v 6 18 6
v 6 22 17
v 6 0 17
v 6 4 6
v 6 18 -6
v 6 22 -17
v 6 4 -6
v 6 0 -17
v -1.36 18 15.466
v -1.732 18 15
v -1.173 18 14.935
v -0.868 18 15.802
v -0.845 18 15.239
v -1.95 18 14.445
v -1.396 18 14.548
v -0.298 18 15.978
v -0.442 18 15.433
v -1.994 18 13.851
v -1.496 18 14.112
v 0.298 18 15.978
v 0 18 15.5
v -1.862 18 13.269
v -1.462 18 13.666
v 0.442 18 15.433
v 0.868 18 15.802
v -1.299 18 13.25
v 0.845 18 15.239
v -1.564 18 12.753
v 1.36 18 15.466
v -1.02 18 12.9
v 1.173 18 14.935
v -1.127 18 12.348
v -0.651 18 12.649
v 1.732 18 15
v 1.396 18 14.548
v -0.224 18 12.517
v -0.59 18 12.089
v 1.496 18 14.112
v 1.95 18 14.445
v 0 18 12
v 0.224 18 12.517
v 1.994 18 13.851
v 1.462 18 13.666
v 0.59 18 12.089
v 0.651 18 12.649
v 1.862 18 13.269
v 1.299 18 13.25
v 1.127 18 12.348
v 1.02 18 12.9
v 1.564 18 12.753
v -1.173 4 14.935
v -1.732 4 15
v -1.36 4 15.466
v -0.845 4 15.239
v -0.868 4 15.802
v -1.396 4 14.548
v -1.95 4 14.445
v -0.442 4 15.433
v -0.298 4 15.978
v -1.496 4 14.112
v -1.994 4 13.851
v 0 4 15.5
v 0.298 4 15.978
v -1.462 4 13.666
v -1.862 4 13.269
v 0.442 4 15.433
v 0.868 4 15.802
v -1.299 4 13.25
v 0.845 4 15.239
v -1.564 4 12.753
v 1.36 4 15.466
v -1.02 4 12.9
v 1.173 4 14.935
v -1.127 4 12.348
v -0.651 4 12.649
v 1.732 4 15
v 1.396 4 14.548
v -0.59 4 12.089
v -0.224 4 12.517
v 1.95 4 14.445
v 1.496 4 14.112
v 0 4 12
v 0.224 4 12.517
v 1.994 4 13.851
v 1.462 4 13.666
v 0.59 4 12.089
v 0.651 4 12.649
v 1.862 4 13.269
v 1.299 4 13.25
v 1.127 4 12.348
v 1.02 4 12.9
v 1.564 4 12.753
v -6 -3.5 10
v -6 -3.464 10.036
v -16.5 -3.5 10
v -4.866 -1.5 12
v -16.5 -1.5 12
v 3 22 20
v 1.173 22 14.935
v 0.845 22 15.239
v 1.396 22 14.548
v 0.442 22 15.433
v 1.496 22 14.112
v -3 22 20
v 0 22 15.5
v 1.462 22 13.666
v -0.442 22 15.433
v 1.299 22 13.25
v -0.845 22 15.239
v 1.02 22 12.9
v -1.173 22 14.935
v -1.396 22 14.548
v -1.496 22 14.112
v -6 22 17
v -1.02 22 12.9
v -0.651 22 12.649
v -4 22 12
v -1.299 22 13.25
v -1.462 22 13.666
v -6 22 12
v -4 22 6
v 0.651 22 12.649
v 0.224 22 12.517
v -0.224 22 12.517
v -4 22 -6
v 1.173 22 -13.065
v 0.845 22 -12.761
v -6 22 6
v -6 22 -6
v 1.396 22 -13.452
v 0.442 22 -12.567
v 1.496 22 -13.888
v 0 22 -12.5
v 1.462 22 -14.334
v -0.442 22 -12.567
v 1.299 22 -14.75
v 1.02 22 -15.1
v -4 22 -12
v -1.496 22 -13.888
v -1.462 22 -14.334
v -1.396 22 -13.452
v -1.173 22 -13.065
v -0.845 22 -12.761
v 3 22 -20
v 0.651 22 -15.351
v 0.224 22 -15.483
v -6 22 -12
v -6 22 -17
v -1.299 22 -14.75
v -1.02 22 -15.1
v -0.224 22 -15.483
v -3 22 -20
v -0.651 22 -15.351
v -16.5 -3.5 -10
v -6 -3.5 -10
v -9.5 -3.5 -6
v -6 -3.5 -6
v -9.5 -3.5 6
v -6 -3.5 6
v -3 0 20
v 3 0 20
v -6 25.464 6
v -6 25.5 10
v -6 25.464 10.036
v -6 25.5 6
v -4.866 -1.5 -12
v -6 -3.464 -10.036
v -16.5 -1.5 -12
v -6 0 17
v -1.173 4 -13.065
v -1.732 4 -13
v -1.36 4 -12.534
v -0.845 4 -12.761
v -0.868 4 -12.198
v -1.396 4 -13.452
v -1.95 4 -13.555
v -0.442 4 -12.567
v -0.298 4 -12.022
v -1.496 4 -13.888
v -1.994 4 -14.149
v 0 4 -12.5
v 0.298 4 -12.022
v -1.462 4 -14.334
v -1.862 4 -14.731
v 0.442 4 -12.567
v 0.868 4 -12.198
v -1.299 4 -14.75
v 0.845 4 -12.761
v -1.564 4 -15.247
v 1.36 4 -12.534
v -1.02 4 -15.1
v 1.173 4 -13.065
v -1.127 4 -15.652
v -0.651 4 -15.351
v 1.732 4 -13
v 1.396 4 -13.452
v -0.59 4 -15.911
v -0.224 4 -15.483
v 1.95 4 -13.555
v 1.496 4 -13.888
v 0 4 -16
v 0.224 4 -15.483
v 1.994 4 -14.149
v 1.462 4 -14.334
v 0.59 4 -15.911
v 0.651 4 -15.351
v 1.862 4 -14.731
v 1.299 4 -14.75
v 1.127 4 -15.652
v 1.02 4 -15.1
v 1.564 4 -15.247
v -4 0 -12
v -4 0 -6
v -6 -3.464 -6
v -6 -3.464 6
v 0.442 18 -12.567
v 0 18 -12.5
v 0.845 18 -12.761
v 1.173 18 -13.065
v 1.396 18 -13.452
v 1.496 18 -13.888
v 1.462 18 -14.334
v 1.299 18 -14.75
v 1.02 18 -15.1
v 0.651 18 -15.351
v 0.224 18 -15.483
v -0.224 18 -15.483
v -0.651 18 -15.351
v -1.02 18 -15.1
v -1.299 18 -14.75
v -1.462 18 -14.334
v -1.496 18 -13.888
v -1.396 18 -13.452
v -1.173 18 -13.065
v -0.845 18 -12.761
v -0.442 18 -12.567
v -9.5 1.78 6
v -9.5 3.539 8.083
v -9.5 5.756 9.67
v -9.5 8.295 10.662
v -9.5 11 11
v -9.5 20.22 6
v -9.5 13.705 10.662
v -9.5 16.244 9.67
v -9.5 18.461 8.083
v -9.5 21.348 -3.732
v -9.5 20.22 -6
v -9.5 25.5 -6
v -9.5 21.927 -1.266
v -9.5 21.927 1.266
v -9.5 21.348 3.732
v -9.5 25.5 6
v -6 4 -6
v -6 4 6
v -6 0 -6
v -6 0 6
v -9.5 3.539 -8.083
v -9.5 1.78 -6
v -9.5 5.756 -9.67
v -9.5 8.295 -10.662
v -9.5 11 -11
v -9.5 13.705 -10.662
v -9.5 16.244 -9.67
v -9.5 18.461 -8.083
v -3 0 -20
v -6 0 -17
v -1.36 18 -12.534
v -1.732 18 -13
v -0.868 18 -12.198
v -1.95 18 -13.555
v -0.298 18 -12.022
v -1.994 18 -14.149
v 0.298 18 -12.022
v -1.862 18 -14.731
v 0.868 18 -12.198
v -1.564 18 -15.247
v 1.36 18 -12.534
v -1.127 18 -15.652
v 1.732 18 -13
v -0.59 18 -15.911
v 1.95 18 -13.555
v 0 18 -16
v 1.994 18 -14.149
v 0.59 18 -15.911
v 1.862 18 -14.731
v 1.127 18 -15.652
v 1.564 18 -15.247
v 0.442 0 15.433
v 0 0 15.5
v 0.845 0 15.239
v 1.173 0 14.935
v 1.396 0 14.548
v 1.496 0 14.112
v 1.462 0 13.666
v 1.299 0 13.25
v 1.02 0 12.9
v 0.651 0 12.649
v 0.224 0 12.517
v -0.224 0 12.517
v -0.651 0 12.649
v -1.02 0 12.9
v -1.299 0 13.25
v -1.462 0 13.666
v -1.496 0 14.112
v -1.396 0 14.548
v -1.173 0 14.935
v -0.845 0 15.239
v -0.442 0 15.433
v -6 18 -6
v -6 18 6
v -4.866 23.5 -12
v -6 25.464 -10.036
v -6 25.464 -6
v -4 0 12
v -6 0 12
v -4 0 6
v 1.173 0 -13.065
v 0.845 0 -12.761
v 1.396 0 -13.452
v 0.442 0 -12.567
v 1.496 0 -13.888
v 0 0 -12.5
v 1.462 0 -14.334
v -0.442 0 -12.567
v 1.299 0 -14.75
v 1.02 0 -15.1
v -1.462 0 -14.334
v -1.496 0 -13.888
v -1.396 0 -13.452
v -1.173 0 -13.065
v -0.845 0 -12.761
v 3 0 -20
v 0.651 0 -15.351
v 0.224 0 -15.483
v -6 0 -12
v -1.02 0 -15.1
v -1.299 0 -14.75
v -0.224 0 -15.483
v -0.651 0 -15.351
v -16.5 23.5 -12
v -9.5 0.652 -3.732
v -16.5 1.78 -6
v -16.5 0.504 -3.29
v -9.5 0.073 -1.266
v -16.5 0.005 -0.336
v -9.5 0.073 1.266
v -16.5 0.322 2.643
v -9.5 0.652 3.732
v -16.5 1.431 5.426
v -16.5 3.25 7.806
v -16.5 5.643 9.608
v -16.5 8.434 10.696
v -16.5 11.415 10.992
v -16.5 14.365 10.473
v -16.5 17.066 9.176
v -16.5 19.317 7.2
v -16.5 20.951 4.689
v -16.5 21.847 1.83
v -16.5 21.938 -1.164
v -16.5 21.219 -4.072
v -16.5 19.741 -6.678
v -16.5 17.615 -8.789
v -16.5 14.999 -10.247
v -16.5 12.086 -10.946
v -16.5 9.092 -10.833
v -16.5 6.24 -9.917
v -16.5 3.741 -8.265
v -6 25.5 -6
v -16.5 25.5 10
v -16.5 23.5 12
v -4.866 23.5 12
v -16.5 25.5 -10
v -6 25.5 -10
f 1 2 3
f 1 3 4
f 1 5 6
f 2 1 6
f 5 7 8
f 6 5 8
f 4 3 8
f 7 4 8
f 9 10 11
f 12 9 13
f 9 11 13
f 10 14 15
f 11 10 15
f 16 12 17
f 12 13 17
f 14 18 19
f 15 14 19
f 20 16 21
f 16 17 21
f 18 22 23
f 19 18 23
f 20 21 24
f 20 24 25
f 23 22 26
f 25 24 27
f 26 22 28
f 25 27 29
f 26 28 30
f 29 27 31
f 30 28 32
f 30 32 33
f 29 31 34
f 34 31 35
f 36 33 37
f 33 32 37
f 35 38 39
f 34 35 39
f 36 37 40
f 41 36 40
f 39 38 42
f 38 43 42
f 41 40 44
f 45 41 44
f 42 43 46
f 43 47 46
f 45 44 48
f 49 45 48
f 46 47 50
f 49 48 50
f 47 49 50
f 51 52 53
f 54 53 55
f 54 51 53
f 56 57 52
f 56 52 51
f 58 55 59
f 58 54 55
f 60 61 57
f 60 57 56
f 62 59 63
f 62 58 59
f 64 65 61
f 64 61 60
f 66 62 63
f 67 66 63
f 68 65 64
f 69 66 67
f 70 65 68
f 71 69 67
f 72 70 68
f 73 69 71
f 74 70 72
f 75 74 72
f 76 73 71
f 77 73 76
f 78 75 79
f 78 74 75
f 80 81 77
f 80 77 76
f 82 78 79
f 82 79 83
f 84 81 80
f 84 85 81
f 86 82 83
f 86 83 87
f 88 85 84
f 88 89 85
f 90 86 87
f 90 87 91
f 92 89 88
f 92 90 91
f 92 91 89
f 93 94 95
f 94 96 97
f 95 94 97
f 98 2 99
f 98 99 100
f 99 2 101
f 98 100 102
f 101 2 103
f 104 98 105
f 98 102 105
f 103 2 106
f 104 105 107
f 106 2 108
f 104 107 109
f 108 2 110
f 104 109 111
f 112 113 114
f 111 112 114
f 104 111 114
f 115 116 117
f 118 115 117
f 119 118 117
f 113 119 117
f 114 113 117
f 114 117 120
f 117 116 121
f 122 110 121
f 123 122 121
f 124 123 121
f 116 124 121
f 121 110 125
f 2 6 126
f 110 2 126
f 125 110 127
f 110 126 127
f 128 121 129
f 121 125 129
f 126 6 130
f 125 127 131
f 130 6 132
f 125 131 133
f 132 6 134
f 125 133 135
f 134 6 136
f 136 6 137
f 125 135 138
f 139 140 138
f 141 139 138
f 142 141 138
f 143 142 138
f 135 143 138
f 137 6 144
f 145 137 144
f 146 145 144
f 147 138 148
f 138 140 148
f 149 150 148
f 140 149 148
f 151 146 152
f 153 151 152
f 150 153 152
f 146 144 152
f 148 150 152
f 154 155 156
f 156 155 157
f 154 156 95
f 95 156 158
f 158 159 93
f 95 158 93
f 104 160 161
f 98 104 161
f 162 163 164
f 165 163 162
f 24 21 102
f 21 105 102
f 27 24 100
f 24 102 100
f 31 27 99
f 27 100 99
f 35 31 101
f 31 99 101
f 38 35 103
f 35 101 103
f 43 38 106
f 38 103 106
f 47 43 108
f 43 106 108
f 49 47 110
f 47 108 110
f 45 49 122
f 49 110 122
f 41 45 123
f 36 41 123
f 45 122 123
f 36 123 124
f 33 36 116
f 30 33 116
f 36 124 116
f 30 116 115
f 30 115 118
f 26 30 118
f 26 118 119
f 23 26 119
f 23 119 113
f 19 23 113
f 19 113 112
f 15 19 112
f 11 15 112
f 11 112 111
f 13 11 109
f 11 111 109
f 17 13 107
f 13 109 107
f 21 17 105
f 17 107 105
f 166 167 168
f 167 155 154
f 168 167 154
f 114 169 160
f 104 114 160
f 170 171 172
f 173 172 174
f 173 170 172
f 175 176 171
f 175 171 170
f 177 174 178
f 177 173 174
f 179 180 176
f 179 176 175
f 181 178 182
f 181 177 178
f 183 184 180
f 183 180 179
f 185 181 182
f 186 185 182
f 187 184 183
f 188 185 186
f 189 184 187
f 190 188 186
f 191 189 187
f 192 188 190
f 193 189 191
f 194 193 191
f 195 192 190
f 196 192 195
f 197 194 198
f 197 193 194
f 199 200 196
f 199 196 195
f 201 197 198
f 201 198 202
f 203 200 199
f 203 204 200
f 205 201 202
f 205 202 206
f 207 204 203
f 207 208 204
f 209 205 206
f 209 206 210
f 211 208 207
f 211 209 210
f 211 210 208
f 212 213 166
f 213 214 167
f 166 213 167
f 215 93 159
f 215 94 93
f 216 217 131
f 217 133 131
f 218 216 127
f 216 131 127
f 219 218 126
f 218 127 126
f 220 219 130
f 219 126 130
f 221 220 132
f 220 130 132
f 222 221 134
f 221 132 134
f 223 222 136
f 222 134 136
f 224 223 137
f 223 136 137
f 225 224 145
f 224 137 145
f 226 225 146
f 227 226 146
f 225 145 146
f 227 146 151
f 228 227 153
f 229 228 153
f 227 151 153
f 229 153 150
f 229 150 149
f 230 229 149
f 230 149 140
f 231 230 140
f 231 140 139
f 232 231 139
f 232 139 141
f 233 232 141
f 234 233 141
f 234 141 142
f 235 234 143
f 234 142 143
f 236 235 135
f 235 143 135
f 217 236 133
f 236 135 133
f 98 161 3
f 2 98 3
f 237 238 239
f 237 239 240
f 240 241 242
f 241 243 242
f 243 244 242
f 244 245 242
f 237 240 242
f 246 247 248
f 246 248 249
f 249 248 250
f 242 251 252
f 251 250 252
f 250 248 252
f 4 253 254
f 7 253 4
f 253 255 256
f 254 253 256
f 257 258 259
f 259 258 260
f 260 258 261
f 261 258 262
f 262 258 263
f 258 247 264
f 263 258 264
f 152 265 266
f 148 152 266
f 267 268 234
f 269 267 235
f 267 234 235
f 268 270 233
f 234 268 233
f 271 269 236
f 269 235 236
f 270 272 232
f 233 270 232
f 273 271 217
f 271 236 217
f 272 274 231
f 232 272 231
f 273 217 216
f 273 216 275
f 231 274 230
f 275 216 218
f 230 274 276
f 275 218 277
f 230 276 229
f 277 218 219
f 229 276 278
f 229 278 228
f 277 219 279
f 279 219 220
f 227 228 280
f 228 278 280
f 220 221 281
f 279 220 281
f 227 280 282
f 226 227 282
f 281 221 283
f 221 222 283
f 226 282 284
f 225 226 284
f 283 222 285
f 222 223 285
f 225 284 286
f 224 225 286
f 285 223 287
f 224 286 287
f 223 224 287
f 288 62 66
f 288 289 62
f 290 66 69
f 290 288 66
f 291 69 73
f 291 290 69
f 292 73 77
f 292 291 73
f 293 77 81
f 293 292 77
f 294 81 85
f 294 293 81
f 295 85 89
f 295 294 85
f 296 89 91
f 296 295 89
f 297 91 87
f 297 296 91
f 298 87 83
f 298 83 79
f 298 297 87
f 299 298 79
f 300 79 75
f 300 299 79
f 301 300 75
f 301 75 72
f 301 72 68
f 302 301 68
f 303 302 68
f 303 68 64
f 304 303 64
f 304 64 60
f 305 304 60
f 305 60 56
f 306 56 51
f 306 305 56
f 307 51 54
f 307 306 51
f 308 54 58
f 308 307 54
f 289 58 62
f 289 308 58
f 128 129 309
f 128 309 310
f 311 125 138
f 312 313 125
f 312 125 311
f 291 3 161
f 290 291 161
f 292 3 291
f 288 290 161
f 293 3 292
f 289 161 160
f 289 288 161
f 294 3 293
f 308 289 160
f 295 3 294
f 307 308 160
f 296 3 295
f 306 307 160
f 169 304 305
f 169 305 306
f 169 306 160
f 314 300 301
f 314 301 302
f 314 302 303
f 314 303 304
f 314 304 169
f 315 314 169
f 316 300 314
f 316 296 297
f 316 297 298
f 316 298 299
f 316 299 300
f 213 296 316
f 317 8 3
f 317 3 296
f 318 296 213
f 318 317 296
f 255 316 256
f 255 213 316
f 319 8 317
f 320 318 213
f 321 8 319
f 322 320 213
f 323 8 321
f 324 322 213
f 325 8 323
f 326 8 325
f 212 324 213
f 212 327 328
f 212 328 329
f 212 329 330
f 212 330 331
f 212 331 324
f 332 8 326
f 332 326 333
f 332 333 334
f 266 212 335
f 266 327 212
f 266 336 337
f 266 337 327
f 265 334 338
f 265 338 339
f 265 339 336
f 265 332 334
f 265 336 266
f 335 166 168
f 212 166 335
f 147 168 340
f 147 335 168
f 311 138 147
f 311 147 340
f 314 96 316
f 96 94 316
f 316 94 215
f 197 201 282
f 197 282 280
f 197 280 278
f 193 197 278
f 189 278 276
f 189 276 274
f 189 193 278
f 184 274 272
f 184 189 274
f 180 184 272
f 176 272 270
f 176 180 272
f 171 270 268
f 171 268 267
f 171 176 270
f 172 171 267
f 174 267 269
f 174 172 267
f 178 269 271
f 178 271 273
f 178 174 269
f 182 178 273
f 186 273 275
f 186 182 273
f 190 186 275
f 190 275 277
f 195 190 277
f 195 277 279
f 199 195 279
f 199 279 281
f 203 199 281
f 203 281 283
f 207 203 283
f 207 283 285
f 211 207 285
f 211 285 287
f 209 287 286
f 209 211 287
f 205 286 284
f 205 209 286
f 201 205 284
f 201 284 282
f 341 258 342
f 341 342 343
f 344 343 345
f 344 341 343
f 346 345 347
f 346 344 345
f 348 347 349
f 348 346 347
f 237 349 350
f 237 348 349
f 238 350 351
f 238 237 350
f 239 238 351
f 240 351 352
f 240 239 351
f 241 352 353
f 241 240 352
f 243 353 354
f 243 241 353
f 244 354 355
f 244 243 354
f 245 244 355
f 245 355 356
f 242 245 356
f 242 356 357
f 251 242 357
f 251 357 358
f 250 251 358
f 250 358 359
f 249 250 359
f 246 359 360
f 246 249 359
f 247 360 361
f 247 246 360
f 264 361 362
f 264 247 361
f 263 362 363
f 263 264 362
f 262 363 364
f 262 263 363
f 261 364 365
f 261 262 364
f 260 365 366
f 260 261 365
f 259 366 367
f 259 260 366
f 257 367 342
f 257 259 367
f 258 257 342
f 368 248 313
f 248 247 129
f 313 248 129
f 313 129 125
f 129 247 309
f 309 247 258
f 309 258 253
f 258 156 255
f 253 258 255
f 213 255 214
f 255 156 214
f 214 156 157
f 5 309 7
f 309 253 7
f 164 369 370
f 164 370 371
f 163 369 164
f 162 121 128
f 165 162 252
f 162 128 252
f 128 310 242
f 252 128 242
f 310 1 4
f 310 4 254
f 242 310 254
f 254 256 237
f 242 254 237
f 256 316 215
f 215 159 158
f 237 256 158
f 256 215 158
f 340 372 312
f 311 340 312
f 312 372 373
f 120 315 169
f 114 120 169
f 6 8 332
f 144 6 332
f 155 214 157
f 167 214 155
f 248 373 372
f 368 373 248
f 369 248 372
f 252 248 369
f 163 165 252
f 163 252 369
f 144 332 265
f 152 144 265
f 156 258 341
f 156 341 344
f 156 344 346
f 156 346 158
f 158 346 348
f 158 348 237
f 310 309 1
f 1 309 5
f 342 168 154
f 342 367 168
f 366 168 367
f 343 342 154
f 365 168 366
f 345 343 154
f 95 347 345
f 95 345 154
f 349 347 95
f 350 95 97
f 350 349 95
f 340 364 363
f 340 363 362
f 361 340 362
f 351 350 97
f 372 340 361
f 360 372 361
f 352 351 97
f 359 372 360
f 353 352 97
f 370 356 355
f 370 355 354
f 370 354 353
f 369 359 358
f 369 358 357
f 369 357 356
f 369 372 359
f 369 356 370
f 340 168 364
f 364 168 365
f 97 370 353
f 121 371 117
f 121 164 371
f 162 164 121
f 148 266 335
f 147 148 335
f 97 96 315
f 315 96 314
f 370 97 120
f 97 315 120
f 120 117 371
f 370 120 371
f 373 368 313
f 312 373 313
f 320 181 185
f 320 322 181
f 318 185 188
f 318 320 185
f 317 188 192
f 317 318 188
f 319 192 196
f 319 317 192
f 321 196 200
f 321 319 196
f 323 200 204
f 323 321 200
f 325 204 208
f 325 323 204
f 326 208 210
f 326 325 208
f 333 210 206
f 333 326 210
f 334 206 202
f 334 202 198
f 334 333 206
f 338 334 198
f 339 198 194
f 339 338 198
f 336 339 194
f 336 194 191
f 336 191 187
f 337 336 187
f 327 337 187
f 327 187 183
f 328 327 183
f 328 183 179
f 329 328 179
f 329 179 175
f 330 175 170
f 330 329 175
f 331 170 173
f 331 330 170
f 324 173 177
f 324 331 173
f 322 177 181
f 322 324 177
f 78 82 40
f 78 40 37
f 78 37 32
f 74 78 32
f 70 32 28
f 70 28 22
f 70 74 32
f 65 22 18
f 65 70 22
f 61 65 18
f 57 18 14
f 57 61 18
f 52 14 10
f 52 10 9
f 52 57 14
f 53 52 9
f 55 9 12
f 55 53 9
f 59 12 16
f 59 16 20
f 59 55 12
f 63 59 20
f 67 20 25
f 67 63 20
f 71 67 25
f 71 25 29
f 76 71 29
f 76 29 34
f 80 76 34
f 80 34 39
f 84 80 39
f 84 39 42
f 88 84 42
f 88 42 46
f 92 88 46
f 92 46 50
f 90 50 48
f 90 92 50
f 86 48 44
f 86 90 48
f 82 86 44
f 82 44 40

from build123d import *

# Parameters (mm, degrees)
SKETCH1_R           = 1.5
BOSS_EXTRUDE1_DEPTH = 3
BOSS_EXTRUDE2_START = 22.5
SKETCH2_W           = 3.5
SKETCH2_H           = 6
BOSS_EXTRUDE2_DEPTH = 29
SKETCH4_R           = 1.5
BOSS_EXTRUDE5_DEPTH = 1
CHAMFER2_SIZE       = 2
CHAMFER2_SIZE2      = 3.464101615
SKETCH3_W           = 24
SKETCH3_H           = 29
SKETCH3_R           = 11
BOSS_EXTRUDE4_DEPTH = 7
CHAMFER3_SIZE       = 2
SKETCH5_R           = 2
BOSS_EXTRUDE6_DEPTH = 14


# Read off the part's stored shape, not the designer's step: Mirror1
with BuildPart() as part:
    # Sketch1 → Boss-Extrude1 (new body)
    with BuildSketch(Plane(origin=(0, 0, 0), x_dir=(1, 0, 0), z_dir=(0, 1, 0))):
        Polygon((-6, 17), (-3, 20), (3, 20), (6, 17), (6, -17), (3, -20), (-3, -20), (-6, -17), align=None)
        with Locations(Location((0, 14, 0), (0, 0, 270))):
            Circle(SKETCH1_R, mode=Mode.SUBTRACT)
        with Locations(Location((0, -14, 0), (0, 0, 270))):
            Circle(SKETCH1_R, mode=Mode.SUBTRACT)
    extrude(amount=BOSS_EXTRUDE1_DEPTH)

    # Sketch2 → Boss-Extrude2 (add)
    with BuildSketch(Plane(origin=(0, 3, 0), x_dir=(1, 0, 0), z_dir=(0, 1, 0)).offset(BOSS_EXTRUDE2_START)):
        with Locations((-7.75, 9)):
            Rectangle(SKETCH2_W, SKETCH2_H)
        with Locations((-7.75, -9)):
            Rectangle(SKETCH2_W, SKETCH2_H)
    extrude(amount=-BOSS_EXTRUDE2_DEPTH)

    # Sketch4 → Boss-Extrude5 (add)
    with BuildSketch(Plane(origin=(0, 3, 0), x_dir=(1, 0, 0), z_dir=(0, 1, 0))):
        Polygon((-3, 20), (-6, 17), (-6, 12), (-6, 6), (-6, -6), (-6, -12), (-6, -17), (-3, -20), (3, -20), (6, -17), (6, 17), (3, 20), align=None)
        with Locations(Location((0, 14, 0), (0, 0, 270))):
            Circle(SKETCH4_R, mode=Mode.SUBTRACT)
        with Locations(Location((0, -14, 0), (0, 0, 270))):
            Circle(SKETCH4_R, mode=Mode.SUBTRACT)
    extrude(amount=BOSS_EXTRUDE5_DEPTH)

    # Chamfer2
    chamfer2_edges = [part.edges().sort_by_distance(p)[0] for p in [
        (-6, 0, -9),
        (-6, 0, 9),
    ]]
    chamfer2_side = [part.faces().sort_by_distance(p)[0] for p in [
        (0, 0, 0),
    ]]
    chamfer(chamfer2_edges, length=CHAMFER2_SIZE, length2=CHAMFER2_SIZE2, reference=chamfer2_side[0])

    # Sketch3 → Boss-Extrude4 (add)
    with BuildSketch(Plane.ZY.offset(9.5)):
        with Locations((0, 11)):
            Rectangle(SKETCH3_W, SKETCH3_H)
        with Locations(Location((0, 11, 0), (0, 0, 236.944268849))):
            Circle(SKETCH3_R, mode=Mode.SUBTRACT)
    extrude(amount=BOSS_EXTRUDE4_DEPTH)

    # Chamfer3
    chamfer3_edges = [part.edges().sort_by_distance(p)[0] for p in [
        (-11.25, 25.5, -12),
        (-11.25, -3.5, -12),
        (-11.25, -3.5, 12),
        (-11.25, 25.5, 12),
    ]]
    chamfer(chamfer3_edges, length=CHAMFER3_SIZE)

    # Mirror1: part across plane


with BuildPart() as part_1:
    add(part.part)
    add(part.part.mirror(Plane(origin=(0, 11, 0), x_dir=(0, 0, 1), z_dir=(0, -1, 0))))

    # Sketch5 → Boss-Extrude6 (add)
    # profile 1 of 2: a face of its own
    with BuildSketch(Plane(origin=(0, 4, 0), x_dir=(1, 0, 0), z_dir=(0, 1, 0))):
        Polygon((6, -6), (-6, -6), (-6, -17), (-3, -20), (3, -20), (6, -17), align=None)
        with Locations(Location((0, -14, 0), (0, 0, 90))):
            Circle(SKETCH5_R, mode=Mode.SUBTRACT)
    # profile 2 of 2: a face of its own
    with BuildSketch(Plane(origin=(0, 4, 0), x_dir=(1, 0, 0), z_dir=(0, 1, 0))):
        Polygon((-6, 17), (-6, 6), (6, 6), (6, 17), (3, 20), (-3, 20), align=None)
        with Locations(Location((0, 14, 0), (0, 0, 90))):
            Circle(SKETCH5_R, mode=Mode.SUBTRACT)
    extrude(amount=BOSS_EXTRUDE6_DEPTH)


solid = part_1.part
